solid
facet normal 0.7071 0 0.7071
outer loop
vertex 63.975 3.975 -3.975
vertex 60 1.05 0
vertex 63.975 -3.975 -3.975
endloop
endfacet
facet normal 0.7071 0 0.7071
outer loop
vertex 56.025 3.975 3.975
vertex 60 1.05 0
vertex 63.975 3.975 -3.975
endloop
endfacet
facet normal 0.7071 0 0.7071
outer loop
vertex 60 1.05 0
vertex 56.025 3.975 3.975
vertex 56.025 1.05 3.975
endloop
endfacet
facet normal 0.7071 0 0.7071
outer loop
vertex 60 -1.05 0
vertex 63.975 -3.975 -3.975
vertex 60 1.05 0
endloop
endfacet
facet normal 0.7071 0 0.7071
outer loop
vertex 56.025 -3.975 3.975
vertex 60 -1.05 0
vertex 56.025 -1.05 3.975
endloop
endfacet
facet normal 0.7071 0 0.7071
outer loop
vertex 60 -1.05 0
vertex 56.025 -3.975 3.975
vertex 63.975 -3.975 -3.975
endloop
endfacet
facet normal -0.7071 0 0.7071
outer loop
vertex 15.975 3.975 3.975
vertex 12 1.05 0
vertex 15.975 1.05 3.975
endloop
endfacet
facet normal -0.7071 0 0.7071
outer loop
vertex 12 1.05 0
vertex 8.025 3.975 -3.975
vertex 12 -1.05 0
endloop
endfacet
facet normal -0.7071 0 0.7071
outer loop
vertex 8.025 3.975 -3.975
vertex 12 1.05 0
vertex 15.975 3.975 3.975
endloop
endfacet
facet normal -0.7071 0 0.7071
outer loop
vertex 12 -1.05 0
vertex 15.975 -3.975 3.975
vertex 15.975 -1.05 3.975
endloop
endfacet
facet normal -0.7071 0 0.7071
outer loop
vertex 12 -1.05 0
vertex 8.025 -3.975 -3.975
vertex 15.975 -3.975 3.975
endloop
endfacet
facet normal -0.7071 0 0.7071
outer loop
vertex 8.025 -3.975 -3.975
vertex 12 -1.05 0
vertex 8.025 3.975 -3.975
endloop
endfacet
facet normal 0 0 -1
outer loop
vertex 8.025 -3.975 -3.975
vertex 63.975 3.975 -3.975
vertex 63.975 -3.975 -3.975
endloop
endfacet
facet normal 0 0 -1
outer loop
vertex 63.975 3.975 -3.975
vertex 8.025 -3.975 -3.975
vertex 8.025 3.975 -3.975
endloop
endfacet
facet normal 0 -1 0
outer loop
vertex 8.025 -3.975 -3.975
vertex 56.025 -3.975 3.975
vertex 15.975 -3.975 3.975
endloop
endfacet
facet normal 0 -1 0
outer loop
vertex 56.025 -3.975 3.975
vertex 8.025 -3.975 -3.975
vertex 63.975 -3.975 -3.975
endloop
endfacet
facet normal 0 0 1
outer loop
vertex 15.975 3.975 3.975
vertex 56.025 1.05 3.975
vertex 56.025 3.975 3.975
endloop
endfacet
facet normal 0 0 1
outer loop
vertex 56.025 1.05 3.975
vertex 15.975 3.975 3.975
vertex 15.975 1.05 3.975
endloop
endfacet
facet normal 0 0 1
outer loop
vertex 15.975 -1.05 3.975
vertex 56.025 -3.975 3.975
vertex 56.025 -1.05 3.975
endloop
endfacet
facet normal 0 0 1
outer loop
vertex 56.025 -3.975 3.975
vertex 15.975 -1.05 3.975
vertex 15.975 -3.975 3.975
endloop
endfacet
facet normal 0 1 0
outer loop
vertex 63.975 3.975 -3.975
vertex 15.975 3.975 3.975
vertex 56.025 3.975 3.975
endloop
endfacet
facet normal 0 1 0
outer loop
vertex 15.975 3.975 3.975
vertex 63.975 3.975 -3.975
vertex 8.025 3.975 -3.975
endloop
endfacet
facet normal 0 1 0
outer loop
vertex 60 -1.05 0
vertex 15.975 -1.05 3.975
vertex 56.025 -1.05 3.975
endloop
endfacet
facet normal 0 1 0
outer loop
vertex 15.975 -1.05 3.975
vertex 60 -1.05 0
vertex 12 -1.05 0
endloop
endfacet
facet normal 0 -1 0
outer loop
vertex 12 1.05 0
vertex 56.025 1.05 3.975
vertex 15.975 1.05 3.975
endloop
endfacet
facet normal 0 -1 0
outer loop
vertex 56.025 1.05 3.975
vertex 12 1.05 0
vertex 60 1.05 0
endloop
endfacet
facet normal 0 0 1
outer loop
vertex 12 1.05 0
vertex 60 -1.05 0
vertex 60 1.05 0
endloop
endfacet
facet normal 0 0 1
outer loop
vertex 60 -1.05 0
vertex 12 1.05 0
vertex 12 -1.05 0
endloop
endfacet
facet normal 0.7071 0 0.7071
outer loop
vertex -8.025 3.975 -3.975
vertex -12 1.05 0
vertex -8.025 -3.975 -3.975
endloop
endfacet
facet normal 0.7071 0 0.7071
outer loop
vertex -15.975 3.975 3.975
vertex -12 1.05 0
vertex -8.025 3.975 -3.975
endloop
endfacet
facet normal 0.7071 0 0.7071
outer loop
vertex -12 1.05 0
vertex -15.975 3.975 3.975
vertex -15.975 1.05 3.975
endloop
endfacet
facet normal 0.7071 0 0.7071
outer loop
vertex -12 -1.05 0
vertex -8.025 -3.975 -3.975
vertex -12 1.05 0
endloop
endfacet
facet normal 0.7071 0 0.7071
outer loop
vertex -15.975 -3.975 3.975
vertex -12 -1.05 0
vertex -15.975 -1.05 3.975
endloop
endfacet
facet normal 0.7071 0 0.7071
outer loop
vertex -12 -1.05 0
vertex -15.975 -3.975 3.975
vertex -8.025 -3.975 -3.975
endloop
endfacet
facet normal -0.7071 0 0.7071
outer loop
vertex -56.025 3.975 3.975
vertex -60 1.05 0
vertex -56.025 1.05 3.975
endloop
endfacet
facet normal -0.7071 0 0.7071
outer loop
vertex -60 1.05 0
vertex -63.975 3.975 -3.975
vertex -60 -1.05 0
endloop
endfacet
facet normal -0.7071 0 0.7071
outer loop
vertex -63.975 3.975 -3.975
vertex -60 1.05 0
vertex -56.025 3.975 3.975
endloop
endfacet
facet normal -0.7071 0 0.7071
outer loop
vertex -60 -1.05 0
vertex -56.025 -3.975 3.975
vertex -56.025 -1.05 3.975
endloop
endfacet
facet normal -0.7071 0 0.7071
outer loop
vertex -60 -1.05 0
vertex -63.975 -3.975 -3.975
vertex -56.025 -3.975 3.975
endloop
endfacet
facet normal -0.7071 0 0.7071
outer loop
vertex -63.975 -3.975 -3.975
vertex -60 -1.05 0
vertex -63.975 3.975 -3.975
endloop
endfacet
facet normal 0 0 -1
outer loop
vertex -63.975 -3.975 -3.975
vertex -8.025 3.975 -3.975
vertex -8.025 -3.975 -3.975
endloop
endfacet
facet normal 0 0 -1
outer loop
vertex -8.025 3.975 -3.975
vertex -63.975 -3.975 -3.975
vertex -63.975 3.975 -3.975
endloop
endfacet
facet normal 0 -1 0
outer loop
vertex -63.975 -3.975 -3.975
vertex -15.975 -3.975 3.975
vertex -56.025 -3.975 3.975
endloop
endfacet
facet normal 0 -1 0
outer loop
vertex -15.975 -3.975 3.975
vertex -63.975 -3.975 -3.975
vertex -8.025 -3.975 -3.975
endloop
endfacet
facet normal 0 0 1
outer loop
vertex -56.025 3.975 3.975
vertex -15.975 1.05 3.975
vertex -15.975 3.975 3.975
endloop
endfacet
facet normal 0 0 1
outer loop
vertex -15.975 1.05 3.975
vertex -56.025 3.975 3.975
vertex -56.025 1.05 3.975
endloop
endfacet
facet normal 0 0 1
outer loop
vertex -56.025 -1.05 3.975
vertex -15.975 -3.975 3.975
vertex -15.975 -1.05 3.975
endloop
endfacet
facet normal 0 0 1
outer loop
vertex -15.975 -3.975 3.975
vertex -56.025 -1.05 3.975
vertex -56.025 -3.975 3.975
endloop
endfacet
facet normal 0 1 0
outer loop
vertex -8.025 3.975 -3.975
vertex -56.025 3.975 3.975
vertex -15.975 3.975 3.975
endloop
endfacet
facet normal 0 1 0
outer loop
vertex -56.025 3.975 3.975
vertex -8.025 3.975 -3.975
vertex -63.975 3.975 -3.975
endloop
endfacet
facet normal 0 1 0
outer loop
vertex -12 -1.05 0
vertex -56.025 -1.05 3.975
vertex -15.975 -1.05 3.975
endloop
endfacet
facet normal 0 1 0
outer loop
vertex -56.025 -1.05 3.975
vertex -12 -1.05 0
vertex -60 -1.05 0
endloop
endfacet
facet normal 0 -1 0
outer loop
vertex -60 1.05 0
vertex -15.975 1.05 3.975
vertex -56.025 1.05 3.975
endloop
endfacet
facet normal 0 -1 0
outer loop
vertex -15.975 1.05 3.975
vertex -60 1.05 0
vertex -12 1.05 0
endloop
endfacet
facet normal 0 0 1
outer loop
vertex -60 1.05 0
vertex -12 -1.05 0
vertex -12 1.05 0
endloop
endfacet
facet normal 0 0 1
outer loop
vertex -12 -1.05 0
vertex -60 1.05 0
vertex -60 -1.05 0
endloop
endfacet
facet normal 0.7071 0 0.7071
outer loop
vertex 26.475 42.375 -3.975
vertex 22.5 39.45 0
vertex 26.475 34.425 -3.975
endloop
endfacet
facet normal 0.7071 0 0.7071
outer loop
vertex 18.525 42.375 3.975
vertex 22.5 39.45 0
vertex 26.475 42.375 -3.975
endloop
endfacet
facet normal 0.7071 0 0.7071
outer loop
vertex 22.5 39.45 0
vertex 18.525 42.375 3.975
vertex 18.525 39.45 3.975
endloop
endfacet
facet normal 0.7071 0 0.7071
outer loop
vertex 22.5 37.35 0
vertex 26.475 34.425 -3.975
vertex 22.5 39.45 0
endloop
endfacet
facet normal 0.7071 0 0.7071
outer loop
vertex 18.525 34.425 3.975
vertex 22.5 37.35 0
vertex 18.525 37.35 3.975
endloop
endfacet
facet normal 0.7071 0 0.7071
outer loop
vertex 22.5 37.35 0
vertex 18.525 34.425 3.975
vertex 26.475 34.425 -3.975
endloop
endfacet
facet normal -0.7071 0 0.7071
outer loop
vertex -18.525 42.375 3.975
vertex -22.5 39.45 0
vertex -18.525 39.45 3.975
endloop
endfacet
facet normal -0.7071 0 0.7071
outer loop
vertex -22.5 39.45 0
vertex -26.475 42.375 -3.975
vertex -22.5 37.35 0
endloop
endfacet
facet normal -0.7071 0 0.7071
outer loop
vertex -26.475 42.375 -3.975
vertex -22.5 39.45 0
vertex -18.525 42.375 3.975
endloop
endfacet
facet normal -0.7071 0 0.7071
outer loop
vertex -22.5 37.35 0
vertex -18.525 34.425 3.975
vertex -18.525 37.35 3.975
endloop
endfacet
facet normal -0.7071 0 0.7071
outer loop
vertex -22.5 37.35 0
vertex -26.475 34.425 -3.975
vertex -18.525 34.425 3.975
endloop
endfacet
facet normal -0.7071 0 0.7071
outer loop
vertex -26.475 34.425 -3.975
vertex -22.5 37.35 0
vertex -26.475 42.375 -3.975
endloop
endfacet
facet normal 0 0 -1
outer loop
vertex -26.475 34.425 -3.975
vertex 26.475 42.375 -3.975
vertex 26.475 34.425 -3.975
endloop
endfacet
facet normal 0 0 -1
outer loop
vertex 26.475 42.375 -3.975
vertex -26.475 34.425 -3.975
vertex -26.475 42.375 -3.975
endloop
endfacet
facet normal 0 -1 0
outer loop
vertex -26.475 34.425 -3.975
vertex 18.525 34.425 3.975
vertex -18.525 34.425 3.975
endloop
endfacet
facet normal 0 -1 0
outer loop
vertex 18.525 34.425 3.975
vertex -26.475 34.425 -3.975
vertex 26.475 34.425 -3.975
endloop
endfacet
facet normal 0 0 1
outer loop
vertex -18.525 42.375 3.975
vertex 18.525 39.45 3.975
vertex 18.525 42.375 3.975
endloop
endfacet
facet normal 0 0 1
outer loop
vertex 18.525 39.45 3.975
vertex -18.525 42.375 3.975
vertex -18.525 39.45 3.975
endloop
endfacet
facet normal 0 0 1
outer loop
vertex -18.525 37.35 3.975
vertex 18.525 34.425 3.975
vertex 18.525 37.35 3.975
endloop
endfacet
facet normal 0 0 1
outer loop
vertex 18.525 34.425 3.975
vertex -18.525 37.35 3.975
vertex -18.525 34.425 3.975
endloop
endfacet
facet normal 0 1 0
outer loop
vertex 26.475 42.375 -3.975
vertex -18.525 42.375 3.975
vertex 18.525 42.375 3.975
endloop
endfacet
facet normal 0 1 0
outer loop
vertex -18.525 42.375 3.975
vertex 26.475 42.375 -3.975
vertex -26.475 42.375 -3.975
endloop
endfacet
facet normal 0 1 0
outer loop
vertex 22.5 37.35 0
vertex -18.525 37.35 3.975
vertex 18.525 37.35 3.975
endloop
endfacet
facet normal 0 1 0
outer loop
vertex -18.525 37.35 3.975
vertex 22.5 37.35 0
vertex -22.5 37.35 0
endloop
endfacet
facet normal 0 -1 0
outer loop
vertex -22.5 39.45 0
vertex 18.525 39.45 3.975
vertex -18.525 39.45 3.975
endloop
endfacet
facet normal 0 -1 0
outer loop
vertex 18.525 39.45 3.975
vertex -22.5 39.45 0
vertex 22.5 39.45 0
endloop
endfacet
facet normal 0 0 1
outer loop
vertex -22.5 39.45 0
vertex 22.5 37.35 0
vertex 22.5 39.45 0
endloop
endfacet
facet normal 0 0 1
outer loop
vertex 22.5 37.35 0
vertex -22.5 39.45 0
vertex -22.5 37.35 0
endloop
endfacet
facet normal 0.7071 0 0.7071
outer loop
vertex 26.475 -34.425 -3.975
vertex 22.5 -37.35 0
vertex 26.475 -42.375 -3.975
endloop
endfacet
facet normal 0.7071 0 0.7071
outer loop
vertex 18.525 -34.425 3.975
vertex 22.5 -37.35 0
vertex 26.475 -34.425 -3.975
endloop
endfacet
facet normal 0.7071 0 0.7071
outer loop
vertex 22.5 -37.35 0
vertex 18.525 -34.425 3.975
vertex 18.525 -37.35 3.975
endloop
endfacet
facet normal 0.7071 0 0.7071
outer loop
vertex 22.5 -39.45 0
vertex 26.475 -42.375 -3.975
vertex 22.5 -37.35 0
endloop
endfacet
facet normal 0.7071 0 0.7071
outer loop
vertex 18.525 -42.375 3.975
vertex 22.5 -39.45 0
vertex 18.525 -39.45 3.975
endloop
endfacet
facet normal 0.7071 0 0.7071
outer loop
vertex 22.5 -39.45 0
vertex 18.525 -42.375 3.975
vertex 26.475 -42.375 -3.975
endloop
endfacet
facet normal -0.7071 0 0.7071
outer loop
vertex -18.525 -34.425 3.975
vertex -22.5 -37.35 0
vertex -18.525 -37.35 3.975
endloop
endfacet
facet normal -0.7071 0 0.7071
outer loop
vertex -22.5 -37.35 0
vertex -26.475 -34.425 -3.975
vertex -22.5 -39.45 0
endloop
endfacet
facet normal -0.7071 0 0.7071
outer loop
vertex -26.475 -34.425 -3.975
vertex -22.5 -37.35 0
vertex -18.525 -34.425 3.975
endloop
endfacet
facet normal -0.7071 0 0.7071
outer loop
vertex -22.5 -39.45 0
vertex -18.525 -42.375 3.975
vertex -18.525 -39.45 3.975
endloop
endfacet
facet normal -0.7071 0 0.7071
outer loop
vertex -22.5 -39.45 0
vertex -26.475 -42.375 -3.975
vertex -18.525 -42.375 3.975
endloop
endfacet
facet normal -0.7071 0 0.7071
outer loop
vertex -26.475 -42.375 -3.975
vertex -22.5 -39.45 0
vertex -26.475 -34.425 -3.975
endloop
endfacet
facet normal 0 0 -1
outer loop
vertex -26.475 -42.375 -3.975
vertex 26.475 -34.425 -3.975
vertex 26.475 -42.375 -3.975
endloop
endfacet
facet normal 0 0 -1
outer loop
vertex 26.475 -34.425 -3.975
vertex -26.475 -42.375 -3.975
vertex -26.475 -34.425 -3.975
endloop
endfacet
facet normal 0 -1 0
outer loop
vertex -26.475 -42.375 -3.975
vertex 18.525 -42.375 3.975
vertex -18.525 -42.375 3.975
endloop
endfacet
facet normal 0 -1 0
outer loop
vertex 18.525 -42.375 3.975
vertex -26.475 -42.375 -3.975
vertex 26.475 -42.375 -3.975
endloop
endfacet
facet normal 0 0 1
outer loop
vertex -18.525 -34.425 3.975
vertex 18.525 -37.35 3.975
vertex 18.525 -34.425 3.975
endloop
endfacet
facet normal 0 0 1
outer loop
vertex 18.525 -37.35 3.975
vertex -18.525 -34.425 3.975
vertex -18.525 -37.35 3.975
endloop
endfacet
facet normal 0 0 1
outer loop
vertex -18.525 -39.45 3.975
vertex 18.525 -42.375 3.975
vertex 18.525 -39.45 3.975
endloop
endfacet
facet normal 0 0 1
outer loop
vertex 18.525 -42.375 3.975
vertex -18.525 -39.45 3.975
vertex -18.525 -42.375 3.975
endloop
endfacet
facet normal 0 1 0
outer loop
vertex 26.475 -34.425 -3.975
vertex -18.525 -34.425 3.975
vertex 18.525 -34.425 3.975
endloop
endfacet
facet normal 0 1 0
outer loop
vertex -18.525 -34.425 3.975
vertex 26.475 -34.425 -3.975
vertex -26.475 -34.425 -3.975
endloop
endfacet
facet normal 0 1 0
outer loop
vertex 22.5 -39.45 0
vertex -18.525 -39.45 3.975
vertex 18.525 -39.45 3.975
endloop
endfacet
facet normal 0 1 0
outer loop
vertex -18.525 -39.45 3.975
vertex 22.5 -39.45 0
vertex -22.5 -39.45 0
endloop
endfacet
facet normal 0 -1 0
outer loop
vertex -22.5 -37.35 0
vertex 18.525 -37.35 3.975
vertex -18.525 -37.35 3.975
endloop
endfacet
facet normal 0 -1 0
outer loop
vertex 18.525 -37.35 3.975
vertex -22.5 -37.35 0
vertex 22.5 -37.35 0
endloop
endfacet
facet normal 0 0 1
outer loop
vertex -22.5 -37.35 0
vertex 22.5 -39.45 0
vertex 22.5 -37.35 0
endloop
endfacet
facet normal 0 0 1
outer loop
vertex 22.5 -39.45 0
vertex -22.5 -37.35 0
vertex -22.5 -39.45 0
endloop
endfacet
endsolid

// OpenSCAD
union() {
	union() {
		union() {
			translate(v = [36.0000000000, 0, 0]) {
				rotate(a = [90, 0, 0]) {
					difference() {
						linear_extrude(center = true, height = 7.9500000000) {
							polygon(paths = [[0, 1, 2, 3]], points = [[-27.9750000000, -3.9750000000], [27.9750000000, -3.9750000000], [20.0250000000, 3.9750000000], [-20.0250000000, 3.9750000000]]);
						}
						translate(v = [0, 2.1000000000, 0]) {
							cube(center = true, size = [48, 4.2000000000, 2.1000000000]);
						}
					}
				}
			}
			translate(v = [-36.0000000000, 0, 0]) {
				rotate(a = [90, 0, 0]) {
					difference() {
						linear_extrude(center = true, height = 7.9500000000) {
							polygon(paths = [[0, 1, 2, 3]], points = [[-27.9750000000, -3.9750000000], [27.9750000000, -3.9750000000], [20.0250000000, 3.9750000000], [-20.0250000000, 3.9750000000]]);
						}
						translate(v = [0, 2.1000000000, 0]) {
							cube(center = true, size = [48, 4.2000000000, 2.1000000000]);
						}
					}
				}
			}
		}
		translate(v = [0, 38.4000000000, 0]) {
			rotate(a = [90, 0, 0]) {
				difference() {
					linear_extrude(center = true, height = 7.9500000000) {
						polygon(paths = [[0, 1, 2, 3]], points = [[-26.4750000000, -3.9750000000], [26.4750000000, -3.9750000000], [18.5250000000, 3.9750000000], [-18.5250000000, 3.9750000000]]);
					}
					translate(v = [0, 2.1000000000, 0]) {
						cube(center = true, size = [45, 4.2000000000, 2.1000000000]);
					}
				}
			}
		}
	}
	translate(v = [0, -38.4000000000, 0]) {
		rotate(a = [90, 0, 0]) {
			difference() {
				linear_extrude(center = true, height = 7.9500000000) {
					polygon(paths = [[0, 1, 2, 3]], points = [[-26.4750000000, -3.9750000000], [26.4750000000, -3.9750000000], [18.5250000000, 3.9750000000], [-18.5250000000, 3.9750000000]]);
				}
				translate(v = [0, 2.1000000000, 0]) {
					cube(center = true, size = [45, 4.2000000000, 2.1000000000]);
				}
			}
		}
	}
}
/***********************************************
*********      SolidPython code:      **********
************************************************
 
from solid.objects import *
from solid.solidpython import scad_render_to_file

from config import *

__author__ = 'Mark Weinreuter'


mirror_w = 45
mirror_h = 48
mirror_th = 2.1
h = 7.95  # mirror_th * 2
d = h  # mirror_th * 2


def side(w):
    h2 = h / 2
    w2 = w / 2 - h2
    w2h = w2 + h

    points = [(-w2h, -h2), (w2h, -h2), (w2, h2), (-w2, h2)]
    bar = linear_extrude(d, center=True)(polygon(points))
    cut = trans(y=mirror_th)(c(w, mirror_th * 2, mirror_th))

    print(points)

    return bar - cut


pos_fac = .8
left = trans(mirror_w * pos_fac)(rot(x=90)(side(mirror_h)))
right = trans(-mirror_w * pos_fac)(rot(x=90)(side(mirror_h)))
top = trans(y=-mirror_h * pos_fac)(rot(x=90)(side(mirror_w)))
bottom = trans(y=mirror_h * pos_fac)(rot(x=90)(side(mirror_w)))

con = left + right + bottom + top
scad_render_to_file(con, "scad/mirror_connector_old.scad")

frame_th = 2
frame = C(mirror_w + 2 * frame_th, mirror_h + 2 * frame_th, mirror_th + frame_th)
mirror = C(mirror_w, mirror_h, mirror_th * 2)
mirror.z = frame.top
mir_con2 = frame - mirror

cut_fit = C(mirror_slit_width, 6, mirror_th + frame_th)
cut_fit.front = frame.back

mir_con2 = cut_fit + mir_con2
scad_render_to_file(mir_con2, "scad/mirror_connector.scad")
 
 
************************************************/
